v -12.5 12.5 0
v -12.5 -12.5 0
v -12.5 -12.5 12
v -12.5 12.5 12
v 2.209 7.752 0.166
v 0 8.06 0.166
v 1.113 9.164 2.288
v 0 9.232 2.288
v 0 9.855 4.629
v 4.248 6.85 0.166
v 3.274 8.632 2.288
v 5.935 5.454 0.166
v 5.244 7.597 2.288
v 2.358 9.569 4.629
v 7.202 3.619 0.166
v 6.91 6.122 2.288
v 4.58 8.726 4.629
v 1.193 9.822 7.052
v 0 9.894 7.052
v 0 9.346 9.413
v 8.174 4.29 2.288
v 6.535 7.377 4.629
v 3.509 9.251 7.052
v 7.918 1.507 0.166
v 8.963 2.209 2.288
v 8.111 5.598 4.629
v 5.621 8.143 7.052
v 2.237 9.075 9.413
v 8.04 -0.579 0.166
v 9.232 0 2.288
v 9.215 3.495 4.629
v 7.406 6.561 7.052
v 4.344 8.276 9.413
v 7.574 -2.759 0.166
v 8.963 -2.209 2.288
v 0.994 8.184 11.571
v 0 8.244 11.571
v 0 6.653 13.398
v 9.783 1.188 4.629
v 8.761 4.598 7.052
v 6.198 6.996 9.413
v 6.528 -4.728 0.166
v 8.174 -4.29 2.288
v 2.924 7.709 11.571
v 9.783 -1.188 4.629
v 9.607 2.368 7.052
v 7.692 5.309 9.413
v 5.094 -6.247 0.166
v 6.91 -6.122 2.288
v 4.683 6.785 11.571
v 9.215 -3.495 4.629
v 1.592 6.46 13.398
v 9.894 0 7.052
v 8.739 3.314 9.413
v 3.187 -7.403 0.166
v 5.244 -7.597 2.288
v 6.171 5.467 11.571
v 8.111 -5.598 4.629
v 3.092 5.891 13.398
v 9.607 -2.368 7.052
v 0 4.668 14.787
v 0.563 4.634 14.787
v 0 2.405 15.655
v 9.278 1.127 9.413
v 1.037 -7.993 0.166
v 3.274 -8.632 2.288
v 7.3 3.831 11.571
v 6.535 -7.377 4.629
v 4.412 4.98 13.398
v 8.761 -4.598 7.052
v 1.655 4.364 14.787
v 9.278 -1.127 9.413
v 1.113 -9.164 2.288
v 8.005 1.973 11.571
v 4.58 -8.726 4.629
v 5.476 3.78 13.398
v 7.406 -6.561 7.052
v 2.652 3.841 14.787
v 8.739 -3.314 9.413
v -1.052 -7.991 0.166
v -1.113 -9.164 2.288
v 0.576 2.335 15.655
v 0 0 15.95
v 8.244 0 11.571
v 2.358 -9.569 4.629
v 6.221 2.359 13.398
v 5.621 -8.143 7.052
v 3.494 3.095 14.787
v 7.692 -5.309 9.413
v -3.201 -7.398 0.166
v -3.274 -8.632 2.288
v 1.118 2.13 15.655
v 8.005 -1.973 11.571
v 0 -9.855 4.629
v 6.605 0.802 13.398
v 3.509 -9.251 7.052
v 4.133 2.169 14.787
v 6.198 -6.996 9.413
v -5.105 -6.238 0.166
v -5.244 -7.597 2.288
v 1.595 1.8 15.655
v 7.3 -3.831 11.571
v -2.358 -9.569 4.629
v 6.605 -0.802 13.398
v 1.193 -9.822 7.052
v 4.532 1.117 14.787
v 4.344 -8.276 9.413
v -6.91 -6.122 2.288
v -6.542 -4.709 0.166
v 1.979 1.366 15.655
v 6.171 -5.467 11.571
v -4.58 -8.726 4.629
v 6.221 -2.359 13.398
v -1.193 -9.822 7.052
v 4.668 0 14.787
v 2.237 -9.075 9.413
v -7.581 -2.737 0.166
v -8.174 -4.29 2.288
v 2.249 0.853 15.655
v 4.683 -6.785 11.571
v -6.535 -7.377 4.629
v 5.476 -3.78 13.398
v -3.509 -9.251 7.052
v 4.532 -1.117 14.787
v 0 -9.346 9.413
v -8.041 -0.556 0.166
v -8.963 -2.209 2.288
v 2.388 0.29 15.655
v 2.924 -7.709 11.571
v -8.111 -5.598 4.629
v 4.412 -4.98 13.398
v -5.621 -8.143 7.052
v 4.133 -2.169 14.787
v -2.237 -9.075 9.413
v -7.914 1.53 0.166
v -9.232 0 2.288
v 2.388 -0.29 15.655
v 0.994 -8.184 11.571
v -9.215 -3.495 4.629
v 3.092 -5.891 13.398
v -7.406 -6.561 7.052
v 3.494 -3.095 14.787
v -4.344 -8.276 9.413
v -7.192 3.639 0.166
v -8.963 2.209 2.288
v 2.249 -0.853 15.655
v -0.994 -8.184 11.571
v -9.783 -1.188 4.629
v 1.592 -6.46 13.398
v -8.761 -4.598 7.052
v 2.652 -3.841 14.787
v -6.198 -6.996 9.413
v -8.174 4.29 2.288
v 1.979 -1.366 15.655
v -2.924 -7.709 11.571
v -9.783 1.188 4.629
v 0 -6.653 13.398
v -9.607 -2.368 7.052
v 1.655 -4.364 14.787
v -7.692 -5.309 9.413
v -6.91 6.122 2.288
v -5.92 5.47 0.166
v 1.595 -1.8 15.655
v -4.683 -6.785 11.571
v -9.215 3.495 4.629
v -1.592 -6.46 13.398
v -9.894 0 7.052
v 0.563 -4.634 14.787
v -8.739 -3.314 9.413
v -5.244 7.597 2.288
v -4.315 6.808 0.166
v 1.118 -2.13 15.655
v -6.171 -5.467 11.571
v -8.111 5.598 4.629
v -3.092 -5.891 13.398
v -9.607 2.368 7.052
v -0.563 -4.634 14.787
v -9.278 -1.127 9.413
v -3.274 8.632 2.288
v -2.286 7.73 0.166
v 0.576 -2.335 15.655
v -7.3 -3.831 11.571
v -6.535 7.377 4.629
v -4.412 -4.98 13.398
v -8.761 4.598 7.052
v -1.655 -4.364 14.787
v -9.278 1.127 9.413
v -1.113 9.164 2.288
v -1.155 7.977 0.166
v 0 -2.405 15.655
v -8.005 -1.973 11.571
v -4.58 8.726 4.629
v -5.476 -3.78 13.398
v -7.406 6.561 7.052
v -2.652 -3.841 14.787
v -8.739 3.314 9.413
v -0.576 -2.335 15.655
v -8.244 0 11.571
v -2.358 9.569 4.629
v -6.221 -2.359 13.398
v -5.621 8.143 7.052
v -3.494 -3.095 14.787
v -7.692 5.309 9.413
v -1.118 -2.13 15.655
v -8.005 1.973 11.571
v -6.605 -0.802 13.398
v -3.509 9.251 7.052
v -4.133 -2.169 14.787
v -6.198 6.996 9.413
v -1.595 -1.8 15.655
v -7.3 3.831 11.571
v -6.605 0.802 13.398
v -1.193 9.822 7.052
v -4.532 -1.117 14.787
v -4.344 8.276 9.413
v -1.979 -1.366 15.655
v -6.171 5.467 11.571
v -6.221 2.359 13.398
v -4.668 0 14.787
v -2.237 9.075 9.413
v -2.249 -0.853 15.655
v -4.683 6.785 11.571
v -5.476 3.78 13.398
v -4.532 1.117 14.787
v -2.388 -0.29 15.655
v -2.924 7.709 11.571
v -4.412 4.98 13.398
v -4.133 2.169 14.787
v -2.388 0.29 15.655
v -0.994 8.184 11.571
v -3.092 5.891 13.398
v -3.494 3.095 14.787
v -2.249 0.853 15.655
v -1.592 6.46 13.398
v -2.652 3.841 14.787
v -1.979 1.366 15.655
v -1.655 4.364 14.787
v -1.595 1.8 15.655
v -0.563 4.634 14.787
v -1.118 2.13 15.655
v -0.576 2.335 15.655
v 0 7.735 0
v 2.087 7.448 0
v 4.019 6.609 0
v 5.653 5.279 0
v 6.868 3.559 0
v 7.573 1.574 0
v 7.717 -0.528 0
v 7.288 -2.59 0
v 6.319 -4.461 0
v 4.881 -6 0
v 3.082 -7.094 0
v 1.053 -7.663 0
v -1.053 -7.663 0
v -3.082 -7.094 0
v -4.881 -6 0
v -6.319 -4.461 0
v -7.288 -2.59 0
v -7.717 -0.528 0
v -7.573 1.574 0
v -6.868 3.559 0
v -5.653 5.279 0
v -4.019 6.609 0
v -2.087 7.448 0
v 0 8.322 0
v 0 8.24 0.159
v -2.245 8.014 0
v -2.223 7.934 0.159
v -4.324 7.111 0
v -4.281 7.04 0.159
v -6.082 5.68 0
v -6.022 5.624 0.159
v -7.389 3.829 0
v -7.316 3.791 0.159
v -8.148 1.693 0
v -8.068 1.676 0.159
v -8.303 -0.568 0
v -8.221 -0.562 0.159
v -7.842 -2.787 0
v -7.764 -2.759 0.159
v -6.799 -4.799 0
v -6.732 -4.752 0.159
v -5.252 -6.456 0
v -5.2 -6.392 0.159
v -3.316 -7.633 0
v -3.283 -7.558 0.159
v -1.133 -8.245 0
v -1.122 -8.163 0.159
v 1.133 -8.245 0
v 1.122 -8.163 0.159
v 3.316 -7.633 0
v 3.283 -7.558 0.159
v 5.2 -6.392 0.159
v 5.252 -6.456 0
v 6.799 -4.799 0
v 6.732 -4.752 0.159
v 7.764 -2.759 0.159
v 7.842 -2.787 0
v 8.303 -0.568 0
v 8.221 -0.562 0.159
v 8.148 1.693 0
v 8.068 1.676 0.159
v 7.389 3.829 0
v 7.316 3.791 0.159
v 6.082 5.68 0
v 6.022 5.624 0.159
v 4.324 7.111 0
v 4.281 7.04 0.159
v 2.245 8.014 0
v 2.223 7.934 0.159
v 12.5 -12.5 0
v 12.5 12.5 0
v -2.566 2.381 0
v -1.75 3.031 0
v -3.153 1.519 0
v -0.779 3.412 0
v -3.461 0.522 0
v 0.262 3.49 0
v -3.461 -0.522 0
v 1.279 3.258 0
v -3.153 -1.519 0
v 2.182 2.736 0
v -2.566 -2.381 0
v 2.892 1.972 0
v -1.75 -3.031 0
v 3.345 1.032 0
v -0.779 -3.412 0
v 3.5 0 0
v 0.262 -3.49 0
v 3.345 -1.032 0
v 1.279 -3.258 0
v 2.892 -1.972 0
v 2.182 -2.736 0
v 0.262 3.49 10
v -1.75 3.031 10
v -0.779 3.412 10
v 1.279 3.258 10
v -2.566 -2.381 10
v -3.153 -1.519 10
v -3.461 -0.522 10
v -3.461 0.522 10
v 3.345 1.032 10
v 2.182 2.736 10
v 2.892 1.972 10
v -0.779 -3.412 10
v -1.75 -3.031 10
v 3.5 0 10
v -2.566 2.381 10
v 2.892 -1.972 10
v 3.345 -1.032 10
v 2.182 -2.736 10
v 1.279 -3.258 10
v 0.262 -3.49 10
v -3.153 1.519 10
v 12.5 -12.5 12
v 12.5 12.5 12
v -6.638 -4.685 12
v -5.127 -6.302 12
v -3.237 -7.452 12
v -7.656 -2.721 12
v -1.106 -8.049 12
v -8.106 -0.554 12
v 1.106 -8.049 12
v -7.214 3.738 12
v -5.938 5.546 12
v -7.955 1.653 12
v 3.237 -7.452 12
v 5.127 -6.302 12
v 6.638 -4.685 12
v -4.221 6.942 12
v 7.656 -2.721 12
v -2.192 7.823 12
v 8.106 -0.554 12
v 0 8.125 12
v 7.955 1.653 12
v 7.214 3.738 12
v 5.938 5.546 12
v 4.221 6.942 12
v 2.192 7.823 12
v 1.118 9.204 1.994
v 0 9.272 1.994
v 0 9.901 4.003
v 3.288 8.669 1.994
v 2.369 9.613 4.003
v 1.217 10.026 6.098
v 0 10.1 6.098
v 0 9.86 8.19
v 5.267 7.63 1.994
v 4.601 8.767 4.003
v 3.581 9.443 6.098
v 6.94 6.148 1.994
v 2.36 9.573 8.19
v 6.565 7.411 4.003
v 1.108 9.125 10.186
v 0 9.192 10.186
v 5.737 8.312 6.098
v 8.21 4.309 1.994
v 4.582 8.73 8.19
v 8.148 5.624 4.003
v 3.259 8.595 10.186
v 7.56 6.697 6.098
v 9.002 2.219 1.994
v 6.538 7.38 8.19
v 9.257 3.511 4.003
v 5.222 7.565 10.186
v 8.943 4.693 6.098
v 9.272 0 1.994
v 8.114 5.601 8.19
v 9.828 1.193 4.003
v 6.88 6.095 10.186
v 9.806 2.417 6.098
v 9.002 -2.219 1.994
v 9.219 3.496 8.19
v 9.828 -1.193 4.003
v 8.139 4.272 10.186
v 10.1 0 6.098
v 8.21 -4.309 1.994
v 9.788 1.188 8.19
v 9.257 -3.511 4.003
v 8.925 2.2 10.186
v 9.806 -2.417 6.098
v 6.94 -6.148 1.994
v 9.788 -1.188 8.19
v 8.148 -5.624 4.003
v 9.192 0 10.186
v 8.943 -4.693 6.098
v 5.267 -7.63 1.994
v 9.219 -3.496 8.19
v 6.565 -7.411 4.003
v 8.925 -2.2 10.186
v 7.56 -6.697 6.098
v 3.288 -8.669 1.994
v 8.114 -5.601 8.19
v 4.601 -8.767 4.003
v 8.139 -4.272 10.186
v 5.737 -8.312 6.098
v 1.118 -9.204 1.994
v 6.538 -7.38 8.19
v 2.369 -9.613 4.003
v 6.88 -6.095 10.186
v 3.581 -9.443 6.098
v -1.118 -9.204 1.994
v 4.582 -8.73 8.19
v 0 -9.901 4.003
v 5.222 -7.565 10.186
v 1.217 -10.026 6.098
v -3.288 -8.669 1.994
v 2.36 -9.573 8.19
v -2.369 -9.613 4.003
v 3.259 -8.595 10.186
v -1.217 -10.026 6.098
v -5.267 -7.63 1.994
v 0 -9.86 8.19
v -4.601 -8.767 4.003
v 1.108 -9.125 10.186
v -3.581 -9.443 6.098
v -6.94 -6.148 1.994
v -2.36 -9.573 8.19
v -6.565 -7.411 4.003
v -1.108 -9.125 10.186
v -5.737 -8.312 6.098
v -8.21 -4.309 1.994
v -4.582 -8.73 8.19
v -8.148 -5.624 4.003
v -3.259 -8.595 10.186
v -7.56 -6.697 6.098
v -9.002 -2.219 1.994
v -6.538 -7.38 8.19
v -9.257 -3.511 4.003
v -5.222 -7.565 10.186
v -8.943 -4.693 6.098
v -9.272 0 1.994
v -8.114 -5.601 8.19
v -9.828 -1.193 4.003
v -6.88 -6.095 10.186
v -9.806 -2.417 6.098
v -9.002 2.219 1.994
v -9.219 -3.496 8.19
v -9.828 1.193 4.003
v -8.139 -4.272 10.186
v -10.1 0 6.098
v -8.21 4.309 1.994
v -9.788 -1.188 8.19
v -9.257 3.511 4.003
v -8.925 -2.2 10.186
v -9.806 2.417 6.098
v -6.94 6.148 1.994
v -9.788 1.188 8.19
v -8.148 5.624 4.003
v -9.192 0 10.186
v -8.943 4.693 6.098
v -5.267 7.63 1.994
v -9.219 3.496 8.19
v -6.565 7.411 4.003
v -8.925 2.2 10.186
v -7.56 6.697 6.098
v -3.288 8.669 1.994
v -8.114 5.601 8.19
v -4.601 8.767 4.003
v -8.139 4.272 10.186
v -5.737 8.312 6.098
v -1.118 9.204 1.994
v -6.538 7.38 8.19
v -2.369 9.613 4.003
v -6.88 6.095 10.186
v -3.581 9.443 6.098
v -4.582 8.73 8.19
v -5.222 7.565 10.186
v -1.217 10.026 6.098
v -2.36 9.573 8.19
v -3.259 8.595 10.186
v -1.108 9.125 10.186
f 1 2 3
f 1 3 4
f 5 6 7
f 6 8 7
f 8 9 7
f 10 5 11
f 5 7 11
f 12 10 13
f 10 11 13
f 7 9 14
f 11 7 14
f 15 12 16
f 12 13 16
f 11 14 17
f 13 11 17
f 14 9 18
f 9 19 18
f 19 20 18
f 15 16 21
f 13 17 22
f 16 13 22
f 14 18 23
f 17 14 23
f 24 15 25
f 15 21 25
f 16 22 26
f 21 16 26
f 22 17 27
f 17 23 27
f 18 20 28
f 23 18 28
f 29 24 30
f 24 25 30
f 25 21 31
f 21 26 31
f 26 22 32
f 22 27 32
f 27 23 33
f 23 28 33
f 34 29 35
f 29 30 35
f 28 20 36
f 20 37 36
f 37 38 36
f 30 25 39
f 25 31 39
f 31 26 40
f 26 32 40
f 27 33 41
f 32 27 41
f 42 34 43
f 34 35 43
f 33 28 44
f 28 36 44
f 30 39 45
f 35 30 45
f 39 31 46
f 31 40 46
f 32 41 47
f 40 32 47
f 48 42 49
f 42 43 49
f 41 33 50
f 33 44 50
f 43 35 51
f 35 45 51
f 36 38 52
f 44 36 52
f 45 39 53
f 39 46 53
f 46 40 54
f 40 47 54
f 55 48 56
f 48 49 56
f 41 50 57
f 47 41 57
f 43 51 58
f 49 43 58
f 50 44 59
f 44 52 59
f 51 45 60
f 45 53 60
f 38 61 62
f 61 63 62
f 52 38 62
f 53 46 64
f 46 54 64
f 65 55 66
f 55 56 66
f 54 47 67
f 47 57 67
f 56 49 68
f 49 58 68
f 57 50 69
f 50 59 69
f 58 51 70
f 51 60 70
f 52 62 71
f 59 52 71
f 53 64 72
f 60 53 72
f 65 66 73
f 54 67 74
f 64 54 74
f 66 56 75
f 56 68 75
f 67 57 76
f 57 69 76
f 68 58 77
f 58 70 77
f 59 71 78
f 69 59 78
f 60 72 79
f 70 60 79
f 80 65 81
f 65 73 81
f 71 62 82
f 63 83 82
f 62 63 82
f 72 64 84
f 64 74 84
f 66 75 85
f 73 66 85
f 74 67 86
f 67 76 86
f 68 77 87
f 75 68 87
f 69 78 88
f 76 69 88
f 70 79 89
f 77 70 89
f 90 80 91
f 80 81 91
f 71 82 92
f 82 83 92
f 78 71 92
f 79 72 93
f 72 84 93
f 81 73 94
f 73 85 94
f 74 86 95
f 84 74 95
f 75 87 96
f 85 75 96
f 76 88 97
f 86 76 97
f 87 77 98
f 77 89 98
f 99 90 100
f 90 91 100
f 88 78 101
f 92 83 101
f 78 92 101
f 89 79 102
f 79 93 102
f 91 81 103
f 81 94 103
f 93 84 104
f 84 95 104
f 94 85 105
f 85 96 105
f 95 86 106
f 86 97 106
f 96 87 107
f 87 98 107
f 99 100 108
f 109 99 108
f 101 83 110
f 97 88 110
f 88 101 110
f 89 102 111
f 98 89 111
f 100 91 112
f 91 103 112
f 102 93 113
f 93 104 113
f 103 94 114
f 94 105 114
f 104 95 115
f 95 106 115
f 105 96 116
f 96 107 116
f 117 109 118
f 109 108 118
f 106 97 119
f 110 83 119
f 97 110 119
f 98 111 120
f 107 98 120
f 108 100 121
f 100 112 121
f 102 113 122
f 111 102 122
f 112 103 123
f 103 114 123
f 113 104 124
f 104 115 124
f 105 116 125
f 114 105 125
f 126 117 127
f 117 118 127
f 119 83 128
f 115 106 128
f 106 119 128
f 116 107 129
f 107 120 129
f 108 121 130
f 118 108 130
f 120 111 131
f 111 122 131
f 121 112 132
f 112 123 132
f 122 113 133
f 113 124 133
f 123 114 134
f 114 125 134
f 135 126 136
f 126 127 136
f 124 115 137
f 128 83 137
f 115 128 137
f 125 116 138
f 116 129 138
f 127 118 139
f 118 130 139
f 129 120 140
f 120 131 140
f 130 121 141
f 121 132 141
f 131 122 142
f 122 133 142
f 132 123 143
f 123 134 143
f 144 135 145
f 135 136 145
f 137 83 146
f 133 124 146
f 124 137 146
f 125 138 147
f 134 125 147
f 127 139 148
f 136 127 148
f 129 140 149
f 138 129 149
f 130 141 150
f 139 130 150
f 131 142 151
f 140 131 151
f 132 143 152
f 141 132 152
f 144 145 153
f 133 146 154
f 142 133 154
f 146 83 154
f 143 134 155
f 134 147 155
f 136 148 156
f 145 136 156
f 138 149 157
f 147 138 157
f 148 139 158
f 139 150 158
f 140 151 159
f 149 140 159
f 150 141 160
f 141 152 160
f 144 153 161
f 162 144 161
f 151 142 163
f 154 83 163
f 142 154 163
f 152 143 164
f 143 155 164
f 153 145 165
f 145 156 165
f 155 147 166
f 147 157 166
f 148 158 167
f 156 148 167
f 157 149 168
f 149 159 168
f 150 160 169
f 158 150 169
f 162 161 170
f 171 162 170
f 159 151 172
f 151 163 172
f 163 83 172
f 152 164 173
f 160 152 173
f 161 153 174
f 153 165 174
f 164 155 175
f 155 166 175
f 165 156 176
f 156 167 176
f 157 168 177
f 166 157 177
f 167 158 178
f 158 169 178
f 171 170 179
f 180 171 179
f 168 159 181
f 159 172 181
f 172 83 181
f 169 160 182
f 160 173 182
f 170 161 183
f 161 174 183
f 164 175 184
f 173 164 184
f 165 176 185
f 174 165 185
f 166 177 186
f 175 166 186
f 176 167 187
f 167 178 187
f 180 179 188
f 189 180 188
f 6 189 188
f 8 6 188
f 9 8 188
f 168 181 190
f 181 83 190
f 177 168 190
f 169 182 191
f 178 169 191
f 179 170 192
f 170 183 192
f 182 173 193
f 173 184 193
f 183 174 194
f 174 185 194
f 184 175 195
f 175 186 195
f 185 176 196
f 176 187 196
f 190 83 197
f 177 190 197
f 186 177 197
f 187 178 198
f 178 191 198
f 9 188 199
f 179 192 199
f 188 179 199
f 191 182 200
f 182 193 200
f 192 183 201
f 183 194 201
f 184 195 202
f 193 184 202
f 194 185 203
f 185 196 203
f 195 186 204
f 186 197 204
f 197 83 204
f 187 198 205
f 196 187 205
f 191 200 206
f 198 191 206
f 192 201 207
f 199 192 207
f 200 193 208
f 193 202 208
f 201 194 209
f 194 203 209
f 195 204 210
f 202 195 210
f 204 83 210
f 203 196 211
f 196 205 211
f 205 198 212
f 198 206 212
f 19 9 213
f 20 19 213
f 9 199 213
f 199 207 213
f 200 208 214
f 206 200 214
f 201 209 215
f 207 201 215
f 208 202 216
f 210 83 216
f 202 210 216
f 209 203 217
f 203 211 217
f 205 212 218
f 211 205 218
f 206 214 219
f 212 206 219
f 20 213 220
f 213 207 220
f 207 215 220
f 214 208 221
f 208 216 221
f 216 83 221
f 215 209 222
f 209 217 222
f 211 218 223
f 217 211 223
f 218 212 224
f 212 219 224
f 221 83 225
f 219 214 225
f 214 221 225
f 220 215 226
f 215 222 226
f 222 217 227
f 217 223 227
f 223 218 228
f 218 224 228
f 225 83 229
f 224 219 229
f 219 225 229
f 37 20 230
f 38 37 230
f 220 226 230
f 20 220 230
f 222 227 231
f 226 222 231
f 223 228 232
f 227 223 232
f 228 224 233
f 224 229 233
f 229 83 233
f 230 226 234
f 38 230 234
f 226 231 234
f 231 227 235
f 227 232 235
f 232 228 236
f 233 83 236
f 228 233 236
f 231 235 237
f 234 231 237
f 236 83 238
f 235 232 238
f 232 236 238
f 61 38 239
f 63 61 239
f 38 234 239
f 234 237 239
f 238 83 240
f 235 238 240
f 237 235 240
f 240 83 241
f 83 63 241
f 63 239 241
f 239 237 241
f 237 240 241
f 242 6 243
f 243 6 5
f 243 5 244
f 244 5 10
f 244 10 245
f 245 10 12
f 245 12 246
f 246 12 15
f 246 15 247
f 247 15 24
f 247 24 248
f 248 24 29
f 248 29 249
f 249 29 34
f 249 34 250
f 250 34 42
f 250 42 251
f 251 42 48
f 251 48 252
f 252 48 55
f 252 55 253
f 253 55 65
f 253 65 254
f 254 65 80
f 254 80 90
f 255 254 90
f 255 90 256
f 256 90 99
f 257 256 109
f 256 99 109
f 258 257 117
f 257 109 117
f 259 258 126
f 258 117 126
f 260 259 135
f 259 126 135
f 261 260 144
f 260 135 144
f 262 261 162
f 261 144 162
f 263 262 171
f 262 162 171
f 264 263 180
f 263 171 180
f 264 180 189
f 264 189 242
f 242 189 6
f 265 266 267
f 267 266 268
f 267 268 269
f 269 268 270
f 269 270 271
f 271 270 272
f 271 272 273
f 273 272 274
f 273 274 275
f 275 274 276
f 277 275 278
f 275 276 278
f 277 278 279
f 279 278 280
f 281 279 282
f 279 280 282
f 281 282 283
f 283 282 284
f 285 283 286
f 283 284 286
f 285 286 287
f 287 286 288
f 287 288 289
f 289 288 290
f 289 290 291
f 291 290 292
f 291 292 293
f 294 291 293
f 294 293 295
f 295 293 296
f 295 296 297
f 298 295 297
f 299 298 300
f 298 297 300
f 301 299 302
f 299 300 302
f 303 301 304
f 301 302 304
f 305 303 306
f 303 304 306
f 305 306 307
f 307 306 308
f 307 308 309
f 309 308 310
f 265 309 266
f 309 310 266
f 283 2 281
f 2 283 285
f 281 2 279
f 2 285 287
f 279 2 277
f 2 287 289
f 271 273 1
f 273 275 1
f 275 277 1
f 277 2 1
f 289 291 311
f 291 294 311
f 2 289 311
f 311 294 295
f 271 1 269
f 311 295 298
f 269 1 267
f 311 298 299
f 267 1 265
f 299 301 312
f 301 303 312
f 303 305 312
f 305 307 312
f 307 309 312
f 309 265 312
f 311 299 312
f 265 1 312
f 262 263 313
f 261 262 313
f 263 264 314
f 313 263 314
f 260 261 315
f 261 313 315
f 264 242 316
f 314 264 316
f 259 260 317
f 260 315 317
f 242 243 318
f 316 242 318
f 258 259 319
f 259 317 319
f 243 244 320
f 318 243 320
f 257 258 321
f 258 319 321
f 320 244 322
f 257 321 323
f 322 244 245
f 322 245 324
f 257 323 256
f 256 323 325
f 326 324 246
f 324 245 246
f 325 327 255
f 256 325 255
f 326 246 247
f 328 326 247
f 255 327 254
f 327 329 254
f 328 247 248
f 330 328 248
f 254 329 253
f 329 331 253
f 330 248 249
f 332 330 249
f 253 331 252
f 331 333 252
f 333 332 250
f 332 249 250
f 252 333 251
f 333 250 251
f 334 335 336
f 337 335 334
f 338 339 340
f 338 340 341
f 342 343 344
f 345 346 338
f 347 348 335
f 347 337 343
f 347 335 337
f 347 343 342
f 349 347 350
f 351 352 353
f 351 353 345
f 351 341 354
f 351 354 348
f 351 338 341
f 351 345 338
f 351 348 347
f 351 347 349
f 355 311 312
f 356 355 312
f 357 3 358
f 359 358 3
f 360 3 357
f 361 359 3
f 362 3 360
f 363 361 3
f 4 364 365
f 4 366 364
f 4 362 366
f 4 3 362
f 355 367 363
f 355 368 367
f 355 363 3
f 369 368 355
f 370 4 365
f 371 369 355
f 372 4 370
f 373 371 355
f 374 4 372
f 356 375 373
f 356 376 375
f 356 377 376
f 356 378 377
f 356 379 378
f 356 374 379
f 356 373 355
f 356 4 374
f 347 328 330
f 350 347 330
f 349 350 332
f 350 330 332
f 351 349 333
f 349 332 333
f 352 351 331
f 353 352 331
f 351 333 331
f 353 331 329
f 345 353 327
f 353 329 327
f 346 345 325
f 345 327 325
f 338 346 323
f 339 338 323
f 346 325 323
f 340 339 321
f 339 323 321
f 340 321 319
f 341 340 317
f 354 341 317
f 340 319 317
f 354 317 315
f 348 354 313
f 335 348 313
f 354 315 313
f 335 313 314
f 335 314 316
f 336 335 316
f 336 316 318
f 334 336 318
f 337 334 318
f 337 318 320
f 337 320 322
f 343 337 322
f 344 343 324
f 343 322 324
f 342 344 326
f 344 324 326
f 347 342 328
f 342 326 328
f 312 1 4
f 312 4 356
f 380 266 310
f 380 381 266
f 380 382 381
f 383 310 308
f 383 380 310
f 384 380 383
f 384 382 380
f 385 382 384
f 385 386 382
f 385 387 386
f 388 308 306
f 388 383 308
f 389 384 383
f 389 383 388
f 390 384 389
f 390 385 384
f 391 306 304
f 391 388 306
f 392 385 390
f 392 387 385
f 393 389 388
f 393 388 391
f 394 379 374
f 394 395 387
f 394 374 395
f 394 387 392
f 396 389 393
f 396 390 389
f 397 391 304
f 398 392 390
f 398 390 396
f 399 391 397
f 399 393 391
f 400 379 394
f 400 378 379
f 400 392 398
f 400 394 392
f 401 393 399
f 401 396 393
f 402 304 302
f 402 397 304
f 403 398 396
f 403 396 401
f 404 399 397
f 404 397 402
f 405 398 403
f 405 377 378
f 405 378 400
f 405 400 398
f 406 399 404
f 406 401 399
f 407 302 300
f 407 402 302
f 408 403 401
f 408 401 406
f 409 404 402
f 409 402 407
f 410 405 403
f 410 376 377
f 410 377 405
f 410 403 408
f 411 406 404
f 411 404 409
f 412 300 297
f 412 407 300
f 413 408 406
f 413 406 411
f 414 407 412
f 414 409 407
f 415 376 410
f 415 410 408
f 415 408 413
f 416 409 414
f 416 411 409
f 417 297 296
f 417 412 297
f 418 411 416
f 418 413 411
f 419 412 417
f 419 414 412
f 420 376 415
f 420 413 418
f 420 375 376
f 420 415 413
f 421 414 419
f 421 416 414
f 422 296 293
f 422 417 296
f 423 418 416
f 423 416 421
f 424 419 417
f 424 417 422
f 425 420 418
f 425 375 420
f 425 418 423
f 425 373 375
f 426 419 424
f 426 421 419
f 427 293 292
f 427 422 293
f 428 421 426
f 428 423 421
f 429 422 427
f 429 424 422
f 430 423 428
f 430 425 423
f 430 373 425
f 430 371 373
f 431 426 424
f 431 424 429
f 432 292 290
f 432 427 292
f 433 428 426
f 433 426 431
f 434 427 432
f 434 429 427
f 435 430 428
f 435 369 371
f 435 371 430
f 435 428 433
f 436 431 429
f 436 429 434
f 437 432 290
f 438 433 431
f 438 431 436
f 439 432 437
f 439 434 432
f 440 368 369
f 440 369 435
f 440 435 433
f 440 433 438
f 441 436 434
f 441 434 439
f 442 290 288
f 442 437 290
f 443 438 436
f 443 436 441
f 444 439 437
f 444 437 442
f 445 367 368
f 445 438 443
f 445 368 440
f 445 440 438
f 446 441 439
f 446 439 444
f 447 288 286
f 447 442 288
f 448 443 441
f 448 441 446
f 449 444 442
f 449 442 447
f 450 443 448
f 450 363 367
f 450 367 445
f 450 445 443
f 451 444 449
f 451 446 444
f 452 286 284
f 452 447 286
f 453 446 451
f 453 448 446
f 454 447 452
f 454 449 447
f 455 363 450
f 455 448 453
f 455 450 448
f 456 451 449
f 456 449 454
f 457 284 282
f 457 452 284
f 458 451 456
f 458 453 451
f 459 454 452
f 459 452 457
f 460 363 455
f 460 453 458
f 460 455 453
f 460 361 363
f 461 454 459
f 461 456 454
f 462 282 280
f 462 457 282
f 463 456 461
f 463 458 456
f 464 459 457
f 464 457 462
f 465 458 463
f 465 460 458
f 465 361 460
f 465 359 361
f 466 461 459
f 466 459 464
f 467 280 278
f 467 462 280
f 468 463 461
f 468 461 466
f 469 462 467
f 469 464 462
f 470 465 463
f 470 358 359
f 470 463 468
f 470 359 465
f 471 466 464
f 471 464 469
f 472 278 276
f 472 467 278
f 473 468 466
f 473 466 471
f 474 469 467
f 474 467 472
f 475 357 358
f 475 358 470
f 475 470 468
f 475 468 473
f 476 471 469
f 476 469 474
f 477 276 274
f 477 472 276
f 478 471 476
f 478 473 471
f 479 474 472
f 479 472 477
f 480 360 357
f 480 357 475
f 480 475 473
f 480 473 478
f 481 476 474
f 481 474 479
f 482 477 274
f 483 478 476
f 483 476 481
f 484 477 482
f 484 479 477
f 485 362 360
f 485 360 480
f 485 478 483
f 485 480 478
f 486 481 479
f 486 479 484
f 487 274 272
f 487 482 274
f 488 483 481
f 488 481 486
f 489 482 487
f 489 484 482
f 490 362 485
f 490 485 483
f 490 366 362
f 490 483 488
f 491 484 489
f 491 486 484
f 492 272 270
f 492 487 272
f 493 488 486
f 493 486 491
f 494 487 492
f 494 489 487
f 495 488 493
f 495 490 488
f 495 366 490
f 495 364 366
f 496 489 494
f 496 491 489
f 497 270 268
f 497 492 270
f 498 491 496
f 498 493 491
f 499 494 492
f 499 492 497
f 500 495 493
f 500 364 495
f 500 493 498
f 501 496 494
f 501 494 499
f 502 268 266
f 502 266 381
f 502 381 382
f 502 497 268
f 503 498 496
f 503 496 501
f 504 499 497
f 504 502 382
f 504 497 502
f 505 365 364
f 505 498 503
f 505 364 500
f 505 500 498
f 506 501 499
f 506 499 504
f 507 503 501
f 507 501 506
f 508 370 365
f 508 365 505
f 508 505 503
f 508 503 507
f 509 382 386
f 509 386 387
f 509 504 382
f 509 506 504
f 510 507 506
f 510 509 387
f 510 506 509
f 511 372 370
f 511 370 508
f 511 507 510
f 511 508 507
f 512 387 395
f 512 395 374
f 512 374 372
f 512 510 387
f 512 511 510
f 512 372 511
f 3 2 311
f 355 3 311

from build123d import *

# Parameters (mm, degrees)
F0_W     = 25
F0_H     = 25
F1_DEPTH = 12
F6_R     = 3.5
F7_DEPTH = 10


# Not quite as in the source:
# - a fillet or chamfer that OpenCascade refuses, or shapes differently, is made with other operations: its cross-section is extruded or revolved along the edge and cut away or added


with BuildPart() as f1:
    # F0 (on Top) → F1 (new body)
    with BuildSketch(Plane.XY):
        Rectangle(F0_W, F0_H)
    extrude(amount=F1_DEPTH)

    # F2 (on Right) → F3 (revolve, cut)
    with BuildSketch(Plane.YZ):
        with BuildLine():
            Line((0, 16.1), (0, -4.1))
            ThreePointArc((0, -4.1), (10.1, 6), (0, 16.1))
        make_face()
    revolve(axis=Axis((0, 0, 6), (0, 0, -1)), mode=Mode.SUBTRACT)

    # F8: chamfer of 0.2 on 1 edges, made by hand

    # F8_s1 → F8_t2 (revolve, cut)
    with BuildSketch(Plane.YZ):
        with BuildLine():
            Line((8.325924515, -0.0071067019), (8.2362376015, 0.1663991572))
            Line((8.2362376015, 0.1663991572), (8.2329742703, 0.1687123087))
            ThreePointArc((8.2329742703, 0.1687123087), (8.1804857118, 0.0831706532), (8.1214361541, 0.0023762376))
            Line((8.1214361541, 0.0023762376), (8.1246538388, -0.004))
            ThreePointArc((8.1246538388, -0.004), (8.2252891769, -0.004), (8.325924515, -0.0111067019))
            Line((8.325924515, -0.0111067019), (8.325924515, -0.0071067019))
        make_face()
    revolve(axis=Axis((0, 0, 0), (0, 0, 1)), mode=Mode.SUBTRACT)


with BuildPart() as f5:
    # F4 (on Right) → F5 (revolve)
    with BuildSketch(Plane.YZ):
        with BuildLine():
            Line((0, 0), (7.9374114168, 0))
            ThreePointArc((7.9374114168, 0), (8.9079318587, 10.432973043), (0, 15.95))
            Line((0, 15.95), (0, 0))
        make_face()
    revolve(axis=Axis((0, 0, 7.975), (0, 0, -1)))

    # F6 (on face) → F7 (cut)
    with BuildSketch(Plane(origin=(0, 0, 0), x_dir=(1, 0, 0), z_dir=(0, 0, -1))):
        Circle(F6_R)
    extrude(amount=-F7_DEPTH, mode=Mode.SUBTRACT)

    # F8#2: chamfer of 0.2 on 1 edges, made by hand

    # F8_2_s1 → F8_2_t2 (revolve, cut)
    with BuildSketch(Plane.YZ):
        with BuildLine():
            Line((7.7277014115, -0.0036384376), (8.0675214314, 0.169899927))
            Line((8.0675214314, 0.169899927), (8.0707617919, 0.1675547055))
            ThreePointArc((8.0707617919, 0.1675547055), (8.0046815514, 0.0833126447), (7.940602336, -0.0024120603))
            Line((7.940602336, -0.0024120603), (7.9374114168, -0.004))
            ThreePointArc((7.9374114168, -0.004), (7.8325564142, -0.004), (7.7277014115, -0.0076384376))
            Line((7.7277014115, -0.0076384376), (7.7277014115, -0.0036384376))
        make_face()
    revolve(axis=Axis((0, 0, 0), (0, 0, -1)), mode=Mode.SUBTRACT)


solid = Compound([f1.part, f5.part])
